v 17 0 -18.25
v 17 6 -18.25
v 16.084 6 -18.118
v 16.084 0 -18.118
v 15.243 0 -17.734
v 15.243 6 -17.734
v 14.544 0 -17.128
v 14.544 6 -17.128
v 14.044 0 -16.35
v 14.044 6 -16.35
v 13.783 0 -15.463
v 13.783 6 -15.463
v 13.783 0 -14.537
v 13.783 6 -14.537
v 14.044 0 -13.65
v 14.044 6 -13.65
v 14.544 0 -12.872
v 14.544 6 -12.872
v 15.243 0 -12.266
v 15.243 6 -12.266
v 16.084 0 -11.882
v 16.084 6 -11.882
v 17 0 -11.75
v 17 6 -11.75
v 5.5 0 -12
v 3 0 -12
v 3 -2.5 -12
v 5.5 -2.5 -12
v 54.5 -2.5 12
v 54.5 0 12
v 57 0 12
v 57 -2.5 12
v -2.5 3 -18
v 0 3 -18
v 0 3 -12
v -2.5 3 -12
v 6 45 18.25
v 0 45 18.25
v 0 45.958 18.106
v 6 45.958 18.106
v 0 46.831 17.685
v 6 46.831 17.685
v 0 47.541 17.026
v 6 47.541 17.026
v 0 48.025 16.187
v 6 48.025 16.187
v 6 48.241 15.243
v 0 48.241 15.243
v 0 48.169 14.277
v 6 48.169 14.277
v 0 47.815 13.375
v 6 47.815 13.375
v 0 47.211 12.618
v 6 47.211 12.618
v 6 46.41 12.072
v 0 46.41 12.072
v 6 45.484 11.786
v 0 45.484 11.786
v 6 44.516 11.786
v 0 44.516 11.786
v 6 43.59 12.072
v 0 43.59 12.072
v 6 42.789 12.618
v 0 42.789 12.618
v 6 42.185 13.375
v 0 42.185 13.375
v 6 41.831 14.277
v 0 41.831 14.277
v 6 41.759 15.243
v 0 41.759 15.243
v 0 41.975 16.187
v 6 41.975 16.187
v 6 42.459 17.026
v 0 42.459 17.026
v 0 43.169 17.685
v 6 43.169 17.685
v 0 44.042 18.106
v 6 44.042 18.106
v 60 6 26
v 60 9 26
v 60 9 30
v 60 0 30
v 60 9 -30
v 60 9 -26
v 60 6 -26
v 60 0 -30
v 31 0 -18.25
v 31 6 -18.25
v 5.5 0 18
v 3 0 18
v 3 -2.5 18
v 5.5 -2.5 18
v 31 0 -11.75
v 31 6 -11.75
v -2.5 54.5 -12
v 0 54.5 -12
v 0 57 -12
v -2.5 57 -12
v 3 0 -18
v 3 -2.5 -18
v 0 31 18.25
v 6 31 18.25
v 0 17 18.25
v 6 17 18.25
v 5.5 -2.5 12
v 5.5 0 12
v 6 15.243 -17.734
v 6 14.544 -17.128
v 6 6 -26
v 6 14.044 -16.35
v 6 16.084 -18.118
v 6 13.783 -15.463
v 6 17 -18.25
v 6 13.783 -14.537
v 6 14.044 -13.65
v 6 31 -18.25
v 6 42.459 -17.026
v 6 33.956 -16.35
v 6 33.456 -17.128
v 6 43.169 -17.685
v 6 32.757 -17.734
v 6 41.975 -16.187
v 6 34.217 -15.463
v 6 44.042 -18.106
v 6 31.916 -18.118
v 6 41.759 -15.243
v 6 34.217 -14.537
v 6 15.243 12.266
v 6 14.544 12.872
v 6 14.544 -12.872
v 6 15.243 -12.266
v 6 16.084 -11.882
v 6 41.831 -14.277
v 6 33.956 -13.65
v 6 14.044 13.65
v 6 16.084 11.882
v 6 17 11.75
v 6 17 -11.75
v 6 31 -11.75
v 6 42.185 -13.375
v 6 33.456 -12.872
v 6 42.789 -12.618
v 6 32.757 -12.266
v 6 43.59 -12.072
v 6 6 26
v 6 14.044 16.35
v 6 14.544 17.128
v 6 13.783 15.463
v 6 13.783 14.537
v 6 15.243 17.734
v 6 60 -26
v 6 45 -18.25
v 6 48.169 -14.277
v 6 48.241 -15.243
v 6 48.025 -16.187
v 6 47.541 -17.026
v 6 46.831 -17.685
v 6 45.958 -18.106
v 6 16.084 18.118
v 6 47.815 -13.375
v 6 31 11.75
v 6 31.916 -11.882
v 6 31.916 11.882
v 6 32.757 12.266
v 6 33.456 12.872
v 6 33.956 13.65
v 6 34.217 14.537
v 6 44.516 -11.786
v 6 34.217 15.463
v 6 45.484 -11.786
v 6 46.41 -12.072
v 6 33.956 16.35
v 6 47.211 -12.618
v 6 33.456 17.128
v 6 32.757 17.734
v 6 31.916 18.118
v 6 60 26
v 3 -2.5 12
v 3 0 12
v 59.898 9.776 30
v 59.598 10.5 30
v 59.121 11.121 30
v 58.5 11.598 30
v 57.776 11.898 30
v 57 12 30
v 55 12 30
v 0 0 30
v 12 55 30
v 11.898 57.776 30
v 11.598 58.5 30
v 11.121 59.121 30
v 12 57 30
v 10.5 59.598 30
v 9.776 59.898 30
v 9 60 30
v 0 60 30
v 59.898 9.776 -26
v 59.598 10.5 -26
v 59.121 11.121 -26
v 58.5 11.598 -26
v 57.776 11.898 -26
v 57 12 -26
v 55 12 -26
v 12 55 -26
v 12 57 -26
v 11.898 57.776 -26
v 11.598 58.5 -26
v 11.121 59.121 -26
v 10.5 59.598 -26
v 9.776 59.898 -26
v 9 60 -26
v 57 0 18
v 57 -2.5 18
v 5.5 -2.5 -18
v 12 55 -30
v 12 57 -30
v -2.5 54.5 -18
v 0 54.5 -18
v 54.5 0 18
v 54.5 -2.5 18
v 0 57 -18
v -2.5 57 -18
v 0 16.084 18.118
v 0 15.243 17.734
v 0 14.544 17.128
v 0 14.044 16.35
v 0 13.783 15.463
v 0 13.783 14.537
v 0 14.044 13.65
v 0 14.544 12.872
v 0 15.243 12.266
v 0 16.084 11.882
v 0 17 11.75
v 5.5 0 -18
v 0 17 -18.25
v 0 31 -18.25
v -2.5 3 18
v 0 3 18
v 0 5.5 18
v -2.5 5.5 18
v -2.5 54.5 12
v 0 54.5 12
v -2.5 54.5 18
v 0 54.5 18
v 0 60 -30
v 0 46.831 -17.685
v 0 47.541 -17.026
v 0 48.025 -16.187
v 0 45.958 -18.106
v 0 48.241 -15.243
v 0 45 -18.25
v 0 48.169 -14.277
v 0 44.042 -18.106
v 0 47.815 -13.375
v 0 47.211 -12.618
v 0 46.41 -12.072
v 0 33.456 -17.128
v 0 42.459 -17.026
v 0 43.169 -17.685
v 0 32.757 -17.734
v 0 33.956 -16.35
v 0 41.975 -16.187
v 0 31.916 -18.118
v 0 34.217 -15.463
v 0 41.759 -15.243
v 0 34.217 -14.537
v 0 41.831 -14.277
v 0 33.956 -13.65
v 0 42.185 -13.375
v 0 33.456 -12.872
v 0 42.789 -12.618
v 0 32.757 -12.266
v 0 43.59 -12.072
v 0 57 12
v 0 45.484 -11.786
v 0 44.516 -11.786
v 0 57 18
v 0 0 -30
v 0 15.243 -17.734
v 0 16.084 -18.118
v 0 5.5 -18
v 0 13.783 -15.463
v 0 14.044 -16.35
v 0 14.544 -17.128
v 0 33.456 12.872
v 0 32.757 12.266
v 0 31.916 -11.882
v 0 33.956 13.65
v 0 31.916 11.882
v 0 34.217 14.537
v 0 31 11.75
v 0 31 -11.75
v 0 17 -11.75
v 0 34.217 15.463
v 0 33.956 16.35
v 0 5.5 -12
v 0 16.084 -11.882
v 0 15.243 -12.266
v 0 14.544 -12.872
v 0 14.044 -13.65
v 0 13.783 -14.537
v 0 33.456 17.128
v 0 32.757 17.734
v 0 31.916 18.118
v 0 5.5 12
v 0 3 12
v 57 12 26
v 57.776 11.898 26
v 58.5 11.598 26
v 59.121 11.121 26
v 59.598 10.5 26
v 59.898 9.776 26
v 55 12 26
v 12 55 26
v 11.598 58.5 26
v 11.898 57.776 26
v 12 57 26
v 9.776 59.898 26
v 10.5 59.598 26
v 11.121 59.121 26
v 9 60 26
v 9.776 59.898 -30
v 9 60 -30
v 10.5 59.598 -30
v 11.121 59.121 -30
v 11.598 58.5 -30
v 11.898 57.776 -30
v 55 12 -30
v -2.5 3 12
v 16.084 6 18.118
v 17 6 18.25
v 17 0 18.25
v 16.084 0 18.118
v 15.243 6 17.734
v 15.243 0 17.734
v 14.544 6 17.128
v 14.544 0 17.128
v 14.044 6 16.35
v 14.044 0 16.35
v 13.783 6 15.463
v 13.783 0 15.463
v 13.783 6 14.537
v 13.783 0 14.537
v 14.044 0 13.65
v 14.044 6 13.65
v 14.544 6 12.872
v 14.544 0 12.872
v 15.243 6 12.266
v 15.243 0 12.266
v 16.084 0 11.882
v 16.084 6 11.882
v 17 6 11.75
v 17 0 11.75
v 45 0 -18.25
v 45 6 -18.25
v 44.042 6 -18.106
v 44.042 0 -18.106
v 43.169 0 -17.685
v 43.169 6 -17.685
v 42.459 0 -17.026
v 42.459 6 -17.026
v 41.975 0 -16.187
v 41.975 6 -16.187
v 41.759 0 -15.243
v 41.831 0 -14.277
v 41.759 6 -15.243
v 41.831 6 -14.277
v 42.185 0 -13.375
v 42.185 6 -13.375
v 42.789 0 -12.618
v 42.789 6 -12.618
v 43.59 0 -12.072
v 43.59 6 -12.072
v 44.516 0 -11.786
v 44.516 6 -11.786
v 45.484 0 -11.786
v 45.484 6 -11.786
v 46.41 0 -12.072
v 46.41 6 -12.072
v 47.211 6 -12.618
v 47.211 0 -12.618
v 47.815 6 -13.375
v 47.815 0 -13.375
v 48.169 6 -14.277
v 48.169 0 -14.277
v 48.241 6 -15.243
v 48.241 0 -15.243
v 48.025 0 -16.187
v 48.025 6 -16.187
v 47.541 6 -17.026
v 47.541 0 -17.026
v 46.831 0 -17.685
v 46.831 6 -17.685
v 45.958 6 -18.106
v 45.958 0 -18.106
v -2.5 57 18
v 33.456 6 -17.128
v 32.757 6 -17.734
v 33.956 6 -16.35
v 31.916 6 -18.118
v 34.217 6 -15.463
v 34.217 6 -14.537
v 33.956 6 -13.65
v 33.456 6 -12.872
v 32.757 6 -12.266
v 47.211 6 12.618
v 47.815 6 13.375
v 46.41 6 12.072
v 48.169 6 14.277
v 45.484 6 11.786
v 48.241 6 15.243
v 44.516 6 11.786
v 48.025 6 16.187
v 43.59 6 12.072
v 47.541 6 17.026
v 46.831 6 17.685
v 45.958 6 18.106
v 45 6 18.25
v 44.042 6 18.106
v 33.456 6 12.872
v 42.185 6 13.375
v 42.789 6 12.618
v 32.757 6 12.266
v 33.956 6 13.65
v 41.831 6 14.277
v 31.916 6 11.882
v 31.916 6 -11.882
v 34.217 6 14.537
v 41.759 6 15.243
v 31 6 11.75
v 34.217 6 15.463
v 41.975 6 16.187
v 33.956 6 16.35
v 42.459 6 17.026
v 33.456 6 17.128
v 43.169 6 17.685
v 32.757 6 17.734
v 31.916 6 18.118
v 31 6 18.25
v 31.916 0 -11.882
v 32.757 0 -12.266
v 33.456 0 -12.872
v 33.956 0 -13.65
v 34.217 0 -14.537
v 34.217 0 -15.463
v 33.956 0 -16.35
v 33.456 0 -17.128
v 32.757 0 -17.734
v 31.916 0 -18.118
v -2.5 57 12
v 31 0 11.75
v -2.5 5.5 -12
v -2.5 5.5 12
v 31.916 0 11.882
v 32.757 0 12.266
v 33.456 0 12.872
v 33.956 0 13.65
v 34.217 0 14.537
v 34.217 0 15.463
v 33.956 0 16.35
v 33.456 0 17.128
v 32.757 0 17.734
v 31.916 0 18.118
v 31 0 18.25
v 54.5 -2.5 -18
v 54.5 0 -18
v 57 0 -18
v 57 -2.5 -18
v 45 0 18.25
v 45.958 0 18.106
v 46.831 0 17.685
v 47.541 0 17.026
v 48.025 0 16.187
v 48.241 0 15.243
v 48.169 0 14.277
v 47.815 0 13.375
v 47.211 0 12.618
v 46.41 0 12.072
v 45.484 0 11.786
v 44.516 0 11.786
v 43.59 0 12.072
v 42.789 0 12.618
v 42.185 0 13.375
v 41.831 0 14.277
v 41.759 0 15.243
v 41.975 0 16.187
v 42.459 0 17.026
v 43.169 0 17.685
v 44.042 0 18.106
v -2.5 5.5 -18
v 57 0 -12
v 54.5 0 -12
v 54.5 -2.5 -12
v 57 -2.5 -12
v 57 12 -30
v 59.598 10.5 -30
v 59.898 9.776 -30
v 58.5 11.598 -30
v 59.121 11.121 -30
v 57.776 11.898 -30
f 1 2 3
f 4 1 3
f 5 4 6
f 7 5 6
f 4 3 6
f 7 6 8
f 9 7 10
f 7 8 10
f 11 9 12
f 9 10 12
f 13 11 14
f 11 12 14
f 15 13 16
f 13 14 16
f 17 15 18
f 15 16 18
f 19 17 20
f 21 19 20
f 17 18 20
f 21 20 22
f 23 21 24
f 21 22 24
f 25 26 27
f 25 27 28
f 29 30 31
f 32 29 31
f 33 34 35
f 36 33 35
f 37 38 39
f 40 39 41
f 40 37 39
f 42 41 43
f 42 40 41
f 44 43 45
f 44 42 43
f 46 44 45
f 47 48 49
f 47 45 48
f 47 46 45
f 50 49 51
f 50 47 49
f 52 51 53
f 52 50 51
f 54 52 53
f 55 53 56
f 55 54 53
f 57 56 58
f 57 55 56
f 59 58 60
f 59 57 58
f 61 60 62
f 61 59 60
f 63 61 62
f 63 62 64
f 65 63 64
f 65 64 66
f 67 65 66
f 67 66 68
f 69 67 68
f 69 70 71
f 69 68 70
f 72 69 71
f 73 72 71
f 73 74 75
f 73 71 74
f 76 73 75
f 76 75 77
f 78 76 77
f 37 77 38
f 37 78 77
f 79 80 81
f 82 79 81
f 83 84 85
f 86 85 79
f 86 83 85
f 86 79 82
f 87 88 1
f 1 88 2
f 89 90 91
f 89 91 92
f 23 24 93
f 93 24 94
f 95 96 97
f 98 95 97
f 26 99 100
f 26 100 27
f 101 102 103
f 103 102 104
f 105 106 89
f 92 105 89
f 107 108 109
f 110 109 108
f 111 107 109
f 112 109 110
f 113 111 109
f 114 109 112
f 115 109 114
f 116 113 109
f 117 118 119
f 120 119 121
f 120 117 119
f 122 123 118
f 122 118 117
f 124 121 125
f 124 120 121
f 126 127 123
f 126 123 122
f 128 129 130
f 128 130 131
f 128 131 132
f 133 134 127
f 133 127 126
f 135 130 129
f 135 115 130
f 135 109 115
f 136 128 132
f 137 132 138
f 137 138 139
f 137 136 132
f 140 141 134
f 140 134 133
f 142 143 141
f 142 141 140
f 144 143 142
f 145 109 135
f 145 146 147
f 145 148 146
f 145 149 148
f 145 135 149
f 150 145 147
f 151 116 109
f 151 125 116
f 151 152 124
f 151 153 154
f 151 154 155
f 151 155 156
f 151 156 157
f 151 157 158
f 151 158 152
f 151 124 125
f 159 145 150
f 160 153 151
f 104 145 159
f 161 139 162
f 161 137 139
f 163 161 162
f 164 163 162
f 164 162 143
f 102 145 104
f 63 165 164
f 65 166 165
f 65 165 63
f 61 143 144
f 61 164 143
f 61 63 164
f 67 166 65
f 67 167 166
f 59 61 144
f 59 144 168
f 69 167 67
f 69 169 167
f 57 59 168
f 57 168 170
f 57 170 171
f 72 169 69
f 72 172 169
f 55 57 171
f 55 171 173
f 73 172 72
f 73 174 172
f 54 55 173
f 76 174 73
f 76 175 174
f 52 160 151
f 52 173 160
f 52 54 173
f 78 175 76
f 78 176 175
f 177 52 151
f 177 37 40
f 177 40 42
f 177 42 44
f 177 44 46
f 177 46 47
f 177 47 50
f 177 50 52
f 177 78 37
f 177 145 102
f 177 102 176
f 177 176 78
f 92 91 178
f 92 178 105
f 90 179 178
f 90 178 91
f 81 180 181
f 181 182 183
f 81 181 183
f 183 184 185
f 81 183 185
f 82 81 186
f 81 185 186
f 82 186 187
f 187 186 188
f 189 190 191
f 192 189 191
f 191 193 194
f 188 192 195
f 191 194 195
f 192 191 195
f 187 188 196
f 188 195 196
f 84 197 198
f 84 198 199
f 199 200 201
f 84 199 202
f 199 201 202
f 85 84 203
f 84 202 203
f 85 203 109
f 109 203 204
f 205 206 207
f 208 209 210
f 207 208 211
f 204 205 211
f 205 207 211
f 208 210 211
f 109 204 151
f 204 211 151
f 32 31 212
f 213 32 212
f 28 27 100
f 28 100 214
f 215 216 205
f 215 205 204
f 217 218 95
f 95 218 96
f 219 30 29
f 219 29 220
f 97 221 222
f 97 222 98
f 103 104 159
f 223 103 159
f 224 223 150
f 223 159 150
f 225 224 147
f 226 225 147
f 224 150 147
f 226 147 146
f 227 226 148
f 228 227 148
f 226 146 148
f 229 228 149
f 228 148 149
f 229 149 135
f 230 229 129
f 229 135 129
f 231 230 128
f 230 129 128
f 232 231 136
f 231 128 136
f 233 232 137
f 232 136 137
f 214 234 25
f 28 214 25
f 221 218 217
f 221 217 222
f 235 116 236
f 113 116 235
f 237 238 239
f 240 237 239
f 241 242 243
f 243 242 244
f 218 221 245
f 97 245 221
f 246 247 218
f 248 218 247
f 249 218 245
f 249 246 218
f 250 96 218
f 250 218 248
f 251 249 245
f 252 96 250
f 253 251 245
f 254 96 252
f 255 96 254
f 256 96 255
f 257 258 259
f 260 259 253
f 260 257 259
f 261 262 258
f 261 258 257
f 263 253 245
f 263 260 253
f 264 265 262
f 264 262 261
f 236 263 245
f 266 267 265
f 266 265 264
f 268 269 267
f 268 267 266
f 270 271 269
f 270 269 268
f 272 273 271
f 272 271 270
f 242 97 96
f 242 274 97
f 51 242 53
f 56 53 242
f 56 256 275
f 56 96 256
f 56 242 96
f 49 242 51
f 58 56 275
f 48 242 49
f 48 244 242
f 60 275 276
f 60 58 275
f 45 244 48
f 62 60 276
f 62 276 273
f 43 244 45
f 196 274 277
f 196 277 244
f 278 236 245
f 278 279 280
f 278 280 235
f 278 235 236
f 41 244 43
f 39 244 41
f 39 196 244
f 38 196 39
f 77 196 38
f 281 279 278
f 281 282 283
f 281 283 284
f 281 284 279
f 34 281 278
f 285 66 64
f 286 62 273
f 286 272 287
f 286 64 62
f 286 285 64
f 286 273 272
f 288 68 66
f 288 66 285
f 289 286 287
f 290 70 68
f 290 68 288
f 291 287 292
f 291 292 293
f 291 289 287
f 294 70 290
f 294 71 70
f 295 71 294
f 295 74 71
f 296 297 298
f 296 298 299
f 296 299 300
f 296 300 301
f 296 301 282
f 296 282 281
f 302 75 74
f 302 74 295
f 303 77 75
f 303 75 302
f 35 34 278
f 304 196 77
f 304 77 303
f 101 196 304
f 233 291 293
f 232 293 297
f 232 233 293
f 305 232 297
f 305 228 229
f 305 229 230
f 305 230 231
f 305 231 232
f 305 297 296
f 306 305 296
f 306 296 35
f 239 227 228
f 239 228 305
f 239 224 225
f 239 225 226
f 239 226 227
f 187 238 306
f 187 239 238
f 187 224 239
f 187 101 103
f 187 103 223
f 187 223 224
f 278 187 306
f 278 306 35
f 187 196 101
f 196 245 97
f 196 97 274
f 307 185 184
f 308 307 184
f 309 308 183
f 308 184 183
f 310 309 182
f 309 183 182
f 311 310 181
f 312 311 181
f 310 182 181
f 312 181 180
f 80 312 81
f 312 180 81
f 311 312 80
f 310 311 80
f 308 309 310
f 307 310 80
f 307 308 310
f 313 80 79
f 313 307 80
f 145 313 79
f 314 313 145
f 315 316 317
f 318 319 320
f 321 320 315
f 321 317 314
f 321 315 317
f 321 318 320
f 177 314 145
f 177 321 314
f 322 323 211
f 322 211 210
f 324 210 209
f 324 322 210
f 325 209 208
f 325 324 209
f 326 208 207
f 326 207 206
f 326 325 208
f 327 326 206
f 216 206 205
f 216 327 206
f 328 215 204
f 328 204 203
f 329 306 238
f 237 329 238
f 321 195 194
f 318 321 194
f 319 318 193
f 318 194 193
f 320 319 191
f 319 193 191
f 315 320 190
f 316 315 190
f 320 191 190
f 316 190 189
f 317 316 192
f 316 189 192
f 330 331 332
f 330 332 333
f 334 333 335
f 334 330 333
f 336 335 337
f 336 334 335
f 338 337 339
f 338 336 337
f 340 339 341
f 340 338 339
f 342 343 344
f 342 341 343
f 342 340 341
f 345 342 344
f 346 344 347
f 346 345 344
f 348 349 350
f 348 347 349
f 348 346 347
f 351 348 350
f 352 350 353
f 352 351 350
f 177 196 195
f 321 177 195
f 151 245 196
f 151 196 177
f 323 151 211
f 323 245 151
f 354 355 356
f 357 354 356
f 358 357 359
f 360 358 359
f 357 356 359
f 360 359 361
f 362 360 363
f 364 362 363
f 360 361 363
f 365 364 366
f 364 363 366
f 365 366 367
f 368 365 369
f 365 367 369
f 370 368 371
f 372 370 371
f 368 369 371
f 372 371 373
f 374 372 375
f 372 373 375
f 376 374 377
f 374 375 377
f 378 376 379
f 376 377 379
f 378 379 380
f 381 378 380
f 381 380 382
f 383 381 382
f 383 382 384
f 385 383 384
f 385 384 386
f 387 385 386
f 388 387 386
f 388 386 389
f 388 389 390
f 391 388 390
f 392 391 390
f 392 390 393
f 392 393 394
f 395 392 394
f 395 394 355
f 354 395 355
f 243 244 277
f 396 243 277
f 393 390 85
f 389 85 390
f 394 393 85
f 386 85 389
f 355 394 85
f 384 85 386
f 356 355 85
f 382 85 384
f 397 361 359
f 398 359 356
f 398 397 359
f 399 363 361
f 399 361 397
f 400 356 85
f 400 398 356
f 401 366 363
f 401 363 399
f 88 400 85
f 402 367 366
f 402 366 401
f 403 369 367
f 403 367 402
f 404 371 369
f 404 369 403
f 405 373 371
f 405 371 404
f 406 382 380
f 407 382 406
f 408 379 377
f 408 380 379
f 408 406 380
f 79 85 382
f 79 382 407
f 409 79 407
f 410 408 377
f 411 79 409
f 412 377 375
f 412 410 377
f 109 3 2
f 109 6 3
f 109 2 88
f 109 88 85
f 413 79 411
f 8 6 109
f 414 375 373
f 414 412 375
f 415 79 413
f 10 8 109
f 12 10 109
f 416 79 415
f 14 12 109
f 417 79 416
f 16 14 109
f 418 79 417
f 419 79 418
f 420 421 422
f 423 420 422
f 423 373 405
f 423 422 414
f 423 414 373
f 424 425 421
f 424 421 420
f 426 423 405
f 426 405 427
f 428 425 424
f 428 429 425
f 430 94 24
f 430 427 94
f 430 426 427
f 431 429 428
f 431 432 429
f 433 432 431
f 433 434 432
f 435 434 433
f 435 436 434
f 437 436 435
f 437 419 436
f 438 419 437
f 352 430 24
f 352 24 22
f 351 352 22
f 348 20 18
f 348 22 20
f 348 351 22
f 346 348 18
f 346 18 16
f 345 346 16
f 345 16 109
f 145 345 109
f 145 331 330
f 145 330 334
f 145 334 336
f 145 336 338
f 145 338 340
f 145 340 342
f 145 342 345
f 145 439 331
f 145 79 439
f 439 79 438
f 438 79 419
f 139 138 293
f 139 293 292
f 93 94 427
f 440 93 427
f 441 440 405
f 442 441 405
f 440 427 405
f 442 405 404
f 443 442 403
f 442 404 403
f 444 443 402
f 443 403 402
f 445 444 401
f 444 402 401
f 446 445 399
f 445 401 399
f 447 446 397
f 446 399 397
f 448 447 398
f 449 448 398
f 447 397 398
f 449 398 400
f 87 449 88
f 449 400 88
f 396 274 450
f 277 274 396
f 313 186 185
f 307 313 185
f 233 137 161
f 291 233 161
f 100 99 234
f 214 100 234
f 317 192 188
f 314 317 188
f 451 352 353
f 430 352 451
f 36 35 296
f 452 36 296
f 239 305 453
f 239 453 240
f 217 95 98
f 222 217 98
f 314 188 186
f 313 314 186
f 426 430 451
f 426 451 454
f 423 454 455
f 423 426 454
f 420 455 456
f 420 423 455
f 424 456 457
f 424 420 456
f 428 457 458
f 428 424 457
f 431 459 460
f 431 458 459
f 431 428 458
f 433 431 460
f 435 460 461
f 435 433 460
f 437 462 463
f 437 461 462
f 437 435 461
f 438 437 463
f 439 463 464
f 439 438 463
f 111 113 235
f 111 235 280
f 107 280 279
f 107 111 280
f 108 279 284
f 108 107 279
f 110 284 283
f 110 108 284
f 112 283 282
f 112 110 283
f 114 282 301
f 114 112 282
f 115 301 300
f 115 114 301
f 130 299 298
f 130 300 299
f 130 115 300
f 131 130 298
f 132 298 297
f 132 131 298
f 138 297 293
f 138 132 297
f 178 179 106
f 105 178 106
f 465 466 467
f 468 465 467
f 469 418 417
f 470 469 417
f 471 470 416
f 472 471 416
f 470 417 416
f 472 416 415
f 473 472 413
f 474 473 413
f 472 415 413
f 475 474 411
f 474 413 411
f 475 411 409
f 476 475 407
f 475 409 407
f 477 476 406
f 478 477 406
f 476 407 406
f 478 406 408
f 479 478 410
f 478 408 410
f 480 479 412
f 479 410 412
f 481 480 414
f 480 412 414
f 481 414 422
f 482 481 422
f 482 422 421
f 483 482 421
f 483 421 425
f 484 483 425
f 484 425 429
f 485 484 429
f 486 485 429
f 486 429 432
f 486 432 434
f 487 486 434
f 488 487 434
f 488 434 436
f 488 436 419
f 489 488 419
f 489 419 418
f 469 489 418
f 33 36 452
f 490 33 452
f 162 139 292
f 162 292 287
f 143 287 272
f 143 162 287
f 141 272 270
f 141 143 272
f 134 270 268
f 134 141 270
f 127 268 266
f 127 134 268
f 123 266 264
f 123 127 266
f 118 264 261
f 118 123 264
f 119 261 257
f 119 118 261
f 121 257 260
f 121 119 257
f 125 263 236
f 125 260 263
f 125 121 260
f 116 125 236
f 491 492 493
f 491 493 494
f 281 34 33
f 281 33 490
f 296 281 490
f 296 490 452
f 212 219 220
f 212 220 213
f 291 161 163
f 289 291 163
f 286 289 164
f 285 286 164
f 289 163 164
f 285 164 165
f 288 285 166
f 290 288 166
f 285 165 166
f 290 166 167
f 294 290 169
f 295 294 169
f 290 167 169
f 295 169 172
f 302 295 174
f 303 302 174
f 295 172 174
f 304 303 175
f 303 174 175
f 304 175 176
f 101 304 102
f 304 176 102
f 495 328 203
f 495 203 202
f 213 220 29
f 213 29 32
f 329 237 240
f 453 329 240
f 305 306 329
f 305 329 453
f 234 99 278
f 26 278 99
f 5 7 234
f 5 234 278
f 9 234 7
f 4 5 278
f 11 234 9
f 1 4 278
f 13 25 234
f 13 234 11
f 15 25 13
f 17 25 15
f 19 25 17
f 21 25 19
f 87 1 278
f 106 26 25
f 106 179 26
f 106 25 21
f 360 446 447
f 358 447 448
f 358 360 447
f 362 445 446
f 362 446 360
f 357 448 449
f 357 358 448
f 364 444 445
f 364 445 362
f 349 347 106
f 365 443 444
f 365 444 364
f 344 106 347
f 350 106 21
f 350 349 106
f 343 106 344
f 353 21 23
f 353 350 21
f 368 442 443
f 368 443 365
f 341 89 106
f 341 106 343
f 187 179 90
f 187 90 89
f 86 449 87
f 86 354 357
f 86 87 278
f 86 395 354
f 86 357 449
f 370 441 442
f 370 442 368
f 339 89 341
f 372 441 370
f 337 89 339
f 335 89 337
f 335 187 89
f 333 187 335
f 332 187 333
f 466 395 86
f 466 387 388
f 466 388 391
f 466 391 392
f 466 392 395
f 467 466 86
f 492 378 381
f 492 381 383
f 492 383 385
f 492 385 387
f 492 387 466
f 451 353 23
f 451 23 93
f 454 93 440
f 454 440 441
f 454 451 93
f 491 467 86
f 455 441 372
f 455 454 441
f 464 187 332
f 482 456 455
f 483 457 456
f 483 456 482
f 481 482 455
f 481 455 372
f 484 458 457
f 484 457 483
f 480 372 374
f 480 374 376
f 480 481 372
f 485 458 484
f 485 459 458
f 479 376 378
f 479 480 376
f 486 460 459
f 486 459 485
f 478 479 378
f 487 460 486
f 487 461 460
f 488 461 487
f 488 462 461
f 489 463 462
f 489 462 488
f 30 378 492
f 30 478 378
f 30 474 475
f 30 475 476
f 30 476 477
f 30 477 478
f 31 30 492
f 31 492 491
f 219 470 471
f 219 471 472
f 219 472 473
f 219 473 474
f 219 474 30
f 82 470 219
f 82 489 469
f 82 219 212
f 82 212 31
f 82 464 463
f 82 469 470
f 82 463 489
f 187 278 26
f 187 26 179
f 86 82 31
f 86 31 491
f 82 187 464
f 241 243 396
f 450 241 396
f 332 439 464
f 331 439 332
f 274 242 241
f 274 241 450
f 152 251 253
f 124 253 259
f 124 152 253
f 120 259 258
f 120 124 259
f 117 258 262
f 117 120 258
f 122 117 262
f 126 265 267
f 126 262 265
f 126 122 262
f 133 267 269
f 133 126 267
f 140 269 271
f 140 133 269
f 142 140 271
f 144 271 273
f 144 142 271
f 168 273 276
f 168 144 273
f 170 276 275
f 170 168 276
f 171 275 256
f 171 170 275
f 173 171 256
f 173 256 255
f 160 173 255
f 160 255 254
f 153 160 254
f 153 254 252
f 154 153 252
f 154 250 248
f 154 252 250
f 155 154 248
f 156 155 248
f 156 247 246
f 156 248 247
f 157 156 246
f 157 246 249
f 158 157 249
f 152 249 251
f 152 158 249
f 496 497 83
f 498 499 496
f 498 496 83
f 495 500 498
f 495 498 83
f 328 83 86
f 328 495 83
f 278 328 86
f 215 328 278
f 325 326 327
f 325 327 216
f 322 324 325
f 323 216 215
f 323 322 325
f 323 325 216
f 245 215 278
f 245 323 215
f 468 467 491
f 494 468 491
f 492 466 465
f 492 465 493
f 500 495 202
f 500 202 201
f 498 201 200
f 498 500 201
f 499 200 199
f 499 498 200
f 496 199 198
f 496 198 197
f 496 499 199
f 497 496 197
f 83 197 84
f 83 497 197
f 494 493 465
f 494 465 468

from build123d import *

# Parameters (mm, degrees)
EXTRUDE_1_DEPTH     = 30
EXTRUDE_2_DEPTH     = 4
SKETCH_3_R          = 3.25
CUT_EXTRUDE_1_DEPTH = 7
SKETCH_4_W          = 2.5
SKETCH_4_H          = 6
EXTRUDE_3_DEPTH     = 2.5


with BuildPart() as part:
    # Эскиз1 → Бобышка-Вытянуть1 (new body, symmetric)
    with BuildSketch(Plane.XY):
        Polygon((0, 60), (0, 0), (60, 0), (60, 6), (6, 6), (6, 60), align=None)
    extrude(amount=EXTRUDE_1_DEPTH, both=True)

    # Эскиз2 → Бобышка-Вытянуть2 (add)
    with BuildSketch(Plane.XY.offset(30)):
        with BuildLine():
            Line((60, 6), (6, 6))
            Line((6, 6), (6, 60))
            Line((6, 60), (9, 60))
            ThreePointArc((9, 60), (11.121320344, 59.121320344), (12, 57))
            Line((12, 57), (12, 55))
            Line((12, 55), (55, 12))
            Line((55, 12), (57, 12))
            ThreePointArc((57, 12), (59.121320344, 11.121320344), (60, 9))
            Line((60, 9), (60, 6))
        make_face()
    extrude_2 = extrude(amount=-EXTRUDE_2_DEPTH)

    # Зеркальное отражение2: Бобышка-Вытянуть2 across plane
    add(extrude_2.mirror(Plane.XY))

    # Эскиз3 → Вырез-Вытянуть1 (cut, through all)
    with BuildSketch(Plane(origin=(0, 6, 0), x_dir=(1, 0, 0), z_dir=(0, 1, 0))):
        with Locations(Location((45, -15, 0), (0, 0, 270))):  # turned: the seam where the file's is
            Circle(SKETCH_3_R)
        with Locations(Location((45, 15, 0), (0, 0, 90))):  # turned: the seam where the file's is
            Circle(SKETCH_3_R)
        with BuildLine():
            Line((17, -11.75), (31, -11.75))
            ThreePointArc((31, -11.75), (34.25, -15), (31, -18.25))
            Line((31, -18.25), (17, -18.25))
            ThreePointArc((17, -18.25), (13.75, -15), (17, -11.75))
        make_face()
        with BuildLine():
            Line((17, 11.75), (31, 11.75))
            ThreePointArc((31, 11.75), (34.25, 15), (31, 18.25))
            Line((31, 18.25), (17, 18.25))
            ThreePointArc((17, 18.25), (13.75, 15), (17, 11.75))
        make_face()
    cut_extrude_1 = extrude(amount=-CUT_EXTRUDE_1_DEPTH, mode=Mode.SUBTRACT)

    # Эскиз4 → Бобышка-Вытянуть3 (add)
    with BuildSketch(Plane.XZ):
        with Locations((4.25, -15)):
            Rectangle(SKETCH_4_W, SKETCH_4_H)
        with Locations((55.75, -15)):
            Rectangle(SKETCH_4_W, SKETCH_4_H)
        with Locations((55.75, 15)):
            Rectangle(SKETCH_4_W, SKETCH_4_H)
        with Locations((4.25, 15)):
            Rectangle(SKETCH_4_W, SKETCH_4_H)
    extrude_3 = extrude(amount=EXTRUDE_3_DEPTH)

    # Зеркальное отражение3: Вырез-Вытянуть1, Бобышка-Вытянуть3 across plane
    add(cut_extrude_1.mirror(Plane(origin=(0, 0, 0), x_dir=(0, 0, 1), z_dir=(-0.707106781, 0.707106781, 0))), mode=Mode.SUBTRACT)
    add(extrude_3.mirror(Plane(origin=(0, 0, 0), x_dir=(0, 0, 1), z_dir=(-0.707106781, 0.707106781, 0))))


solid = part.part
